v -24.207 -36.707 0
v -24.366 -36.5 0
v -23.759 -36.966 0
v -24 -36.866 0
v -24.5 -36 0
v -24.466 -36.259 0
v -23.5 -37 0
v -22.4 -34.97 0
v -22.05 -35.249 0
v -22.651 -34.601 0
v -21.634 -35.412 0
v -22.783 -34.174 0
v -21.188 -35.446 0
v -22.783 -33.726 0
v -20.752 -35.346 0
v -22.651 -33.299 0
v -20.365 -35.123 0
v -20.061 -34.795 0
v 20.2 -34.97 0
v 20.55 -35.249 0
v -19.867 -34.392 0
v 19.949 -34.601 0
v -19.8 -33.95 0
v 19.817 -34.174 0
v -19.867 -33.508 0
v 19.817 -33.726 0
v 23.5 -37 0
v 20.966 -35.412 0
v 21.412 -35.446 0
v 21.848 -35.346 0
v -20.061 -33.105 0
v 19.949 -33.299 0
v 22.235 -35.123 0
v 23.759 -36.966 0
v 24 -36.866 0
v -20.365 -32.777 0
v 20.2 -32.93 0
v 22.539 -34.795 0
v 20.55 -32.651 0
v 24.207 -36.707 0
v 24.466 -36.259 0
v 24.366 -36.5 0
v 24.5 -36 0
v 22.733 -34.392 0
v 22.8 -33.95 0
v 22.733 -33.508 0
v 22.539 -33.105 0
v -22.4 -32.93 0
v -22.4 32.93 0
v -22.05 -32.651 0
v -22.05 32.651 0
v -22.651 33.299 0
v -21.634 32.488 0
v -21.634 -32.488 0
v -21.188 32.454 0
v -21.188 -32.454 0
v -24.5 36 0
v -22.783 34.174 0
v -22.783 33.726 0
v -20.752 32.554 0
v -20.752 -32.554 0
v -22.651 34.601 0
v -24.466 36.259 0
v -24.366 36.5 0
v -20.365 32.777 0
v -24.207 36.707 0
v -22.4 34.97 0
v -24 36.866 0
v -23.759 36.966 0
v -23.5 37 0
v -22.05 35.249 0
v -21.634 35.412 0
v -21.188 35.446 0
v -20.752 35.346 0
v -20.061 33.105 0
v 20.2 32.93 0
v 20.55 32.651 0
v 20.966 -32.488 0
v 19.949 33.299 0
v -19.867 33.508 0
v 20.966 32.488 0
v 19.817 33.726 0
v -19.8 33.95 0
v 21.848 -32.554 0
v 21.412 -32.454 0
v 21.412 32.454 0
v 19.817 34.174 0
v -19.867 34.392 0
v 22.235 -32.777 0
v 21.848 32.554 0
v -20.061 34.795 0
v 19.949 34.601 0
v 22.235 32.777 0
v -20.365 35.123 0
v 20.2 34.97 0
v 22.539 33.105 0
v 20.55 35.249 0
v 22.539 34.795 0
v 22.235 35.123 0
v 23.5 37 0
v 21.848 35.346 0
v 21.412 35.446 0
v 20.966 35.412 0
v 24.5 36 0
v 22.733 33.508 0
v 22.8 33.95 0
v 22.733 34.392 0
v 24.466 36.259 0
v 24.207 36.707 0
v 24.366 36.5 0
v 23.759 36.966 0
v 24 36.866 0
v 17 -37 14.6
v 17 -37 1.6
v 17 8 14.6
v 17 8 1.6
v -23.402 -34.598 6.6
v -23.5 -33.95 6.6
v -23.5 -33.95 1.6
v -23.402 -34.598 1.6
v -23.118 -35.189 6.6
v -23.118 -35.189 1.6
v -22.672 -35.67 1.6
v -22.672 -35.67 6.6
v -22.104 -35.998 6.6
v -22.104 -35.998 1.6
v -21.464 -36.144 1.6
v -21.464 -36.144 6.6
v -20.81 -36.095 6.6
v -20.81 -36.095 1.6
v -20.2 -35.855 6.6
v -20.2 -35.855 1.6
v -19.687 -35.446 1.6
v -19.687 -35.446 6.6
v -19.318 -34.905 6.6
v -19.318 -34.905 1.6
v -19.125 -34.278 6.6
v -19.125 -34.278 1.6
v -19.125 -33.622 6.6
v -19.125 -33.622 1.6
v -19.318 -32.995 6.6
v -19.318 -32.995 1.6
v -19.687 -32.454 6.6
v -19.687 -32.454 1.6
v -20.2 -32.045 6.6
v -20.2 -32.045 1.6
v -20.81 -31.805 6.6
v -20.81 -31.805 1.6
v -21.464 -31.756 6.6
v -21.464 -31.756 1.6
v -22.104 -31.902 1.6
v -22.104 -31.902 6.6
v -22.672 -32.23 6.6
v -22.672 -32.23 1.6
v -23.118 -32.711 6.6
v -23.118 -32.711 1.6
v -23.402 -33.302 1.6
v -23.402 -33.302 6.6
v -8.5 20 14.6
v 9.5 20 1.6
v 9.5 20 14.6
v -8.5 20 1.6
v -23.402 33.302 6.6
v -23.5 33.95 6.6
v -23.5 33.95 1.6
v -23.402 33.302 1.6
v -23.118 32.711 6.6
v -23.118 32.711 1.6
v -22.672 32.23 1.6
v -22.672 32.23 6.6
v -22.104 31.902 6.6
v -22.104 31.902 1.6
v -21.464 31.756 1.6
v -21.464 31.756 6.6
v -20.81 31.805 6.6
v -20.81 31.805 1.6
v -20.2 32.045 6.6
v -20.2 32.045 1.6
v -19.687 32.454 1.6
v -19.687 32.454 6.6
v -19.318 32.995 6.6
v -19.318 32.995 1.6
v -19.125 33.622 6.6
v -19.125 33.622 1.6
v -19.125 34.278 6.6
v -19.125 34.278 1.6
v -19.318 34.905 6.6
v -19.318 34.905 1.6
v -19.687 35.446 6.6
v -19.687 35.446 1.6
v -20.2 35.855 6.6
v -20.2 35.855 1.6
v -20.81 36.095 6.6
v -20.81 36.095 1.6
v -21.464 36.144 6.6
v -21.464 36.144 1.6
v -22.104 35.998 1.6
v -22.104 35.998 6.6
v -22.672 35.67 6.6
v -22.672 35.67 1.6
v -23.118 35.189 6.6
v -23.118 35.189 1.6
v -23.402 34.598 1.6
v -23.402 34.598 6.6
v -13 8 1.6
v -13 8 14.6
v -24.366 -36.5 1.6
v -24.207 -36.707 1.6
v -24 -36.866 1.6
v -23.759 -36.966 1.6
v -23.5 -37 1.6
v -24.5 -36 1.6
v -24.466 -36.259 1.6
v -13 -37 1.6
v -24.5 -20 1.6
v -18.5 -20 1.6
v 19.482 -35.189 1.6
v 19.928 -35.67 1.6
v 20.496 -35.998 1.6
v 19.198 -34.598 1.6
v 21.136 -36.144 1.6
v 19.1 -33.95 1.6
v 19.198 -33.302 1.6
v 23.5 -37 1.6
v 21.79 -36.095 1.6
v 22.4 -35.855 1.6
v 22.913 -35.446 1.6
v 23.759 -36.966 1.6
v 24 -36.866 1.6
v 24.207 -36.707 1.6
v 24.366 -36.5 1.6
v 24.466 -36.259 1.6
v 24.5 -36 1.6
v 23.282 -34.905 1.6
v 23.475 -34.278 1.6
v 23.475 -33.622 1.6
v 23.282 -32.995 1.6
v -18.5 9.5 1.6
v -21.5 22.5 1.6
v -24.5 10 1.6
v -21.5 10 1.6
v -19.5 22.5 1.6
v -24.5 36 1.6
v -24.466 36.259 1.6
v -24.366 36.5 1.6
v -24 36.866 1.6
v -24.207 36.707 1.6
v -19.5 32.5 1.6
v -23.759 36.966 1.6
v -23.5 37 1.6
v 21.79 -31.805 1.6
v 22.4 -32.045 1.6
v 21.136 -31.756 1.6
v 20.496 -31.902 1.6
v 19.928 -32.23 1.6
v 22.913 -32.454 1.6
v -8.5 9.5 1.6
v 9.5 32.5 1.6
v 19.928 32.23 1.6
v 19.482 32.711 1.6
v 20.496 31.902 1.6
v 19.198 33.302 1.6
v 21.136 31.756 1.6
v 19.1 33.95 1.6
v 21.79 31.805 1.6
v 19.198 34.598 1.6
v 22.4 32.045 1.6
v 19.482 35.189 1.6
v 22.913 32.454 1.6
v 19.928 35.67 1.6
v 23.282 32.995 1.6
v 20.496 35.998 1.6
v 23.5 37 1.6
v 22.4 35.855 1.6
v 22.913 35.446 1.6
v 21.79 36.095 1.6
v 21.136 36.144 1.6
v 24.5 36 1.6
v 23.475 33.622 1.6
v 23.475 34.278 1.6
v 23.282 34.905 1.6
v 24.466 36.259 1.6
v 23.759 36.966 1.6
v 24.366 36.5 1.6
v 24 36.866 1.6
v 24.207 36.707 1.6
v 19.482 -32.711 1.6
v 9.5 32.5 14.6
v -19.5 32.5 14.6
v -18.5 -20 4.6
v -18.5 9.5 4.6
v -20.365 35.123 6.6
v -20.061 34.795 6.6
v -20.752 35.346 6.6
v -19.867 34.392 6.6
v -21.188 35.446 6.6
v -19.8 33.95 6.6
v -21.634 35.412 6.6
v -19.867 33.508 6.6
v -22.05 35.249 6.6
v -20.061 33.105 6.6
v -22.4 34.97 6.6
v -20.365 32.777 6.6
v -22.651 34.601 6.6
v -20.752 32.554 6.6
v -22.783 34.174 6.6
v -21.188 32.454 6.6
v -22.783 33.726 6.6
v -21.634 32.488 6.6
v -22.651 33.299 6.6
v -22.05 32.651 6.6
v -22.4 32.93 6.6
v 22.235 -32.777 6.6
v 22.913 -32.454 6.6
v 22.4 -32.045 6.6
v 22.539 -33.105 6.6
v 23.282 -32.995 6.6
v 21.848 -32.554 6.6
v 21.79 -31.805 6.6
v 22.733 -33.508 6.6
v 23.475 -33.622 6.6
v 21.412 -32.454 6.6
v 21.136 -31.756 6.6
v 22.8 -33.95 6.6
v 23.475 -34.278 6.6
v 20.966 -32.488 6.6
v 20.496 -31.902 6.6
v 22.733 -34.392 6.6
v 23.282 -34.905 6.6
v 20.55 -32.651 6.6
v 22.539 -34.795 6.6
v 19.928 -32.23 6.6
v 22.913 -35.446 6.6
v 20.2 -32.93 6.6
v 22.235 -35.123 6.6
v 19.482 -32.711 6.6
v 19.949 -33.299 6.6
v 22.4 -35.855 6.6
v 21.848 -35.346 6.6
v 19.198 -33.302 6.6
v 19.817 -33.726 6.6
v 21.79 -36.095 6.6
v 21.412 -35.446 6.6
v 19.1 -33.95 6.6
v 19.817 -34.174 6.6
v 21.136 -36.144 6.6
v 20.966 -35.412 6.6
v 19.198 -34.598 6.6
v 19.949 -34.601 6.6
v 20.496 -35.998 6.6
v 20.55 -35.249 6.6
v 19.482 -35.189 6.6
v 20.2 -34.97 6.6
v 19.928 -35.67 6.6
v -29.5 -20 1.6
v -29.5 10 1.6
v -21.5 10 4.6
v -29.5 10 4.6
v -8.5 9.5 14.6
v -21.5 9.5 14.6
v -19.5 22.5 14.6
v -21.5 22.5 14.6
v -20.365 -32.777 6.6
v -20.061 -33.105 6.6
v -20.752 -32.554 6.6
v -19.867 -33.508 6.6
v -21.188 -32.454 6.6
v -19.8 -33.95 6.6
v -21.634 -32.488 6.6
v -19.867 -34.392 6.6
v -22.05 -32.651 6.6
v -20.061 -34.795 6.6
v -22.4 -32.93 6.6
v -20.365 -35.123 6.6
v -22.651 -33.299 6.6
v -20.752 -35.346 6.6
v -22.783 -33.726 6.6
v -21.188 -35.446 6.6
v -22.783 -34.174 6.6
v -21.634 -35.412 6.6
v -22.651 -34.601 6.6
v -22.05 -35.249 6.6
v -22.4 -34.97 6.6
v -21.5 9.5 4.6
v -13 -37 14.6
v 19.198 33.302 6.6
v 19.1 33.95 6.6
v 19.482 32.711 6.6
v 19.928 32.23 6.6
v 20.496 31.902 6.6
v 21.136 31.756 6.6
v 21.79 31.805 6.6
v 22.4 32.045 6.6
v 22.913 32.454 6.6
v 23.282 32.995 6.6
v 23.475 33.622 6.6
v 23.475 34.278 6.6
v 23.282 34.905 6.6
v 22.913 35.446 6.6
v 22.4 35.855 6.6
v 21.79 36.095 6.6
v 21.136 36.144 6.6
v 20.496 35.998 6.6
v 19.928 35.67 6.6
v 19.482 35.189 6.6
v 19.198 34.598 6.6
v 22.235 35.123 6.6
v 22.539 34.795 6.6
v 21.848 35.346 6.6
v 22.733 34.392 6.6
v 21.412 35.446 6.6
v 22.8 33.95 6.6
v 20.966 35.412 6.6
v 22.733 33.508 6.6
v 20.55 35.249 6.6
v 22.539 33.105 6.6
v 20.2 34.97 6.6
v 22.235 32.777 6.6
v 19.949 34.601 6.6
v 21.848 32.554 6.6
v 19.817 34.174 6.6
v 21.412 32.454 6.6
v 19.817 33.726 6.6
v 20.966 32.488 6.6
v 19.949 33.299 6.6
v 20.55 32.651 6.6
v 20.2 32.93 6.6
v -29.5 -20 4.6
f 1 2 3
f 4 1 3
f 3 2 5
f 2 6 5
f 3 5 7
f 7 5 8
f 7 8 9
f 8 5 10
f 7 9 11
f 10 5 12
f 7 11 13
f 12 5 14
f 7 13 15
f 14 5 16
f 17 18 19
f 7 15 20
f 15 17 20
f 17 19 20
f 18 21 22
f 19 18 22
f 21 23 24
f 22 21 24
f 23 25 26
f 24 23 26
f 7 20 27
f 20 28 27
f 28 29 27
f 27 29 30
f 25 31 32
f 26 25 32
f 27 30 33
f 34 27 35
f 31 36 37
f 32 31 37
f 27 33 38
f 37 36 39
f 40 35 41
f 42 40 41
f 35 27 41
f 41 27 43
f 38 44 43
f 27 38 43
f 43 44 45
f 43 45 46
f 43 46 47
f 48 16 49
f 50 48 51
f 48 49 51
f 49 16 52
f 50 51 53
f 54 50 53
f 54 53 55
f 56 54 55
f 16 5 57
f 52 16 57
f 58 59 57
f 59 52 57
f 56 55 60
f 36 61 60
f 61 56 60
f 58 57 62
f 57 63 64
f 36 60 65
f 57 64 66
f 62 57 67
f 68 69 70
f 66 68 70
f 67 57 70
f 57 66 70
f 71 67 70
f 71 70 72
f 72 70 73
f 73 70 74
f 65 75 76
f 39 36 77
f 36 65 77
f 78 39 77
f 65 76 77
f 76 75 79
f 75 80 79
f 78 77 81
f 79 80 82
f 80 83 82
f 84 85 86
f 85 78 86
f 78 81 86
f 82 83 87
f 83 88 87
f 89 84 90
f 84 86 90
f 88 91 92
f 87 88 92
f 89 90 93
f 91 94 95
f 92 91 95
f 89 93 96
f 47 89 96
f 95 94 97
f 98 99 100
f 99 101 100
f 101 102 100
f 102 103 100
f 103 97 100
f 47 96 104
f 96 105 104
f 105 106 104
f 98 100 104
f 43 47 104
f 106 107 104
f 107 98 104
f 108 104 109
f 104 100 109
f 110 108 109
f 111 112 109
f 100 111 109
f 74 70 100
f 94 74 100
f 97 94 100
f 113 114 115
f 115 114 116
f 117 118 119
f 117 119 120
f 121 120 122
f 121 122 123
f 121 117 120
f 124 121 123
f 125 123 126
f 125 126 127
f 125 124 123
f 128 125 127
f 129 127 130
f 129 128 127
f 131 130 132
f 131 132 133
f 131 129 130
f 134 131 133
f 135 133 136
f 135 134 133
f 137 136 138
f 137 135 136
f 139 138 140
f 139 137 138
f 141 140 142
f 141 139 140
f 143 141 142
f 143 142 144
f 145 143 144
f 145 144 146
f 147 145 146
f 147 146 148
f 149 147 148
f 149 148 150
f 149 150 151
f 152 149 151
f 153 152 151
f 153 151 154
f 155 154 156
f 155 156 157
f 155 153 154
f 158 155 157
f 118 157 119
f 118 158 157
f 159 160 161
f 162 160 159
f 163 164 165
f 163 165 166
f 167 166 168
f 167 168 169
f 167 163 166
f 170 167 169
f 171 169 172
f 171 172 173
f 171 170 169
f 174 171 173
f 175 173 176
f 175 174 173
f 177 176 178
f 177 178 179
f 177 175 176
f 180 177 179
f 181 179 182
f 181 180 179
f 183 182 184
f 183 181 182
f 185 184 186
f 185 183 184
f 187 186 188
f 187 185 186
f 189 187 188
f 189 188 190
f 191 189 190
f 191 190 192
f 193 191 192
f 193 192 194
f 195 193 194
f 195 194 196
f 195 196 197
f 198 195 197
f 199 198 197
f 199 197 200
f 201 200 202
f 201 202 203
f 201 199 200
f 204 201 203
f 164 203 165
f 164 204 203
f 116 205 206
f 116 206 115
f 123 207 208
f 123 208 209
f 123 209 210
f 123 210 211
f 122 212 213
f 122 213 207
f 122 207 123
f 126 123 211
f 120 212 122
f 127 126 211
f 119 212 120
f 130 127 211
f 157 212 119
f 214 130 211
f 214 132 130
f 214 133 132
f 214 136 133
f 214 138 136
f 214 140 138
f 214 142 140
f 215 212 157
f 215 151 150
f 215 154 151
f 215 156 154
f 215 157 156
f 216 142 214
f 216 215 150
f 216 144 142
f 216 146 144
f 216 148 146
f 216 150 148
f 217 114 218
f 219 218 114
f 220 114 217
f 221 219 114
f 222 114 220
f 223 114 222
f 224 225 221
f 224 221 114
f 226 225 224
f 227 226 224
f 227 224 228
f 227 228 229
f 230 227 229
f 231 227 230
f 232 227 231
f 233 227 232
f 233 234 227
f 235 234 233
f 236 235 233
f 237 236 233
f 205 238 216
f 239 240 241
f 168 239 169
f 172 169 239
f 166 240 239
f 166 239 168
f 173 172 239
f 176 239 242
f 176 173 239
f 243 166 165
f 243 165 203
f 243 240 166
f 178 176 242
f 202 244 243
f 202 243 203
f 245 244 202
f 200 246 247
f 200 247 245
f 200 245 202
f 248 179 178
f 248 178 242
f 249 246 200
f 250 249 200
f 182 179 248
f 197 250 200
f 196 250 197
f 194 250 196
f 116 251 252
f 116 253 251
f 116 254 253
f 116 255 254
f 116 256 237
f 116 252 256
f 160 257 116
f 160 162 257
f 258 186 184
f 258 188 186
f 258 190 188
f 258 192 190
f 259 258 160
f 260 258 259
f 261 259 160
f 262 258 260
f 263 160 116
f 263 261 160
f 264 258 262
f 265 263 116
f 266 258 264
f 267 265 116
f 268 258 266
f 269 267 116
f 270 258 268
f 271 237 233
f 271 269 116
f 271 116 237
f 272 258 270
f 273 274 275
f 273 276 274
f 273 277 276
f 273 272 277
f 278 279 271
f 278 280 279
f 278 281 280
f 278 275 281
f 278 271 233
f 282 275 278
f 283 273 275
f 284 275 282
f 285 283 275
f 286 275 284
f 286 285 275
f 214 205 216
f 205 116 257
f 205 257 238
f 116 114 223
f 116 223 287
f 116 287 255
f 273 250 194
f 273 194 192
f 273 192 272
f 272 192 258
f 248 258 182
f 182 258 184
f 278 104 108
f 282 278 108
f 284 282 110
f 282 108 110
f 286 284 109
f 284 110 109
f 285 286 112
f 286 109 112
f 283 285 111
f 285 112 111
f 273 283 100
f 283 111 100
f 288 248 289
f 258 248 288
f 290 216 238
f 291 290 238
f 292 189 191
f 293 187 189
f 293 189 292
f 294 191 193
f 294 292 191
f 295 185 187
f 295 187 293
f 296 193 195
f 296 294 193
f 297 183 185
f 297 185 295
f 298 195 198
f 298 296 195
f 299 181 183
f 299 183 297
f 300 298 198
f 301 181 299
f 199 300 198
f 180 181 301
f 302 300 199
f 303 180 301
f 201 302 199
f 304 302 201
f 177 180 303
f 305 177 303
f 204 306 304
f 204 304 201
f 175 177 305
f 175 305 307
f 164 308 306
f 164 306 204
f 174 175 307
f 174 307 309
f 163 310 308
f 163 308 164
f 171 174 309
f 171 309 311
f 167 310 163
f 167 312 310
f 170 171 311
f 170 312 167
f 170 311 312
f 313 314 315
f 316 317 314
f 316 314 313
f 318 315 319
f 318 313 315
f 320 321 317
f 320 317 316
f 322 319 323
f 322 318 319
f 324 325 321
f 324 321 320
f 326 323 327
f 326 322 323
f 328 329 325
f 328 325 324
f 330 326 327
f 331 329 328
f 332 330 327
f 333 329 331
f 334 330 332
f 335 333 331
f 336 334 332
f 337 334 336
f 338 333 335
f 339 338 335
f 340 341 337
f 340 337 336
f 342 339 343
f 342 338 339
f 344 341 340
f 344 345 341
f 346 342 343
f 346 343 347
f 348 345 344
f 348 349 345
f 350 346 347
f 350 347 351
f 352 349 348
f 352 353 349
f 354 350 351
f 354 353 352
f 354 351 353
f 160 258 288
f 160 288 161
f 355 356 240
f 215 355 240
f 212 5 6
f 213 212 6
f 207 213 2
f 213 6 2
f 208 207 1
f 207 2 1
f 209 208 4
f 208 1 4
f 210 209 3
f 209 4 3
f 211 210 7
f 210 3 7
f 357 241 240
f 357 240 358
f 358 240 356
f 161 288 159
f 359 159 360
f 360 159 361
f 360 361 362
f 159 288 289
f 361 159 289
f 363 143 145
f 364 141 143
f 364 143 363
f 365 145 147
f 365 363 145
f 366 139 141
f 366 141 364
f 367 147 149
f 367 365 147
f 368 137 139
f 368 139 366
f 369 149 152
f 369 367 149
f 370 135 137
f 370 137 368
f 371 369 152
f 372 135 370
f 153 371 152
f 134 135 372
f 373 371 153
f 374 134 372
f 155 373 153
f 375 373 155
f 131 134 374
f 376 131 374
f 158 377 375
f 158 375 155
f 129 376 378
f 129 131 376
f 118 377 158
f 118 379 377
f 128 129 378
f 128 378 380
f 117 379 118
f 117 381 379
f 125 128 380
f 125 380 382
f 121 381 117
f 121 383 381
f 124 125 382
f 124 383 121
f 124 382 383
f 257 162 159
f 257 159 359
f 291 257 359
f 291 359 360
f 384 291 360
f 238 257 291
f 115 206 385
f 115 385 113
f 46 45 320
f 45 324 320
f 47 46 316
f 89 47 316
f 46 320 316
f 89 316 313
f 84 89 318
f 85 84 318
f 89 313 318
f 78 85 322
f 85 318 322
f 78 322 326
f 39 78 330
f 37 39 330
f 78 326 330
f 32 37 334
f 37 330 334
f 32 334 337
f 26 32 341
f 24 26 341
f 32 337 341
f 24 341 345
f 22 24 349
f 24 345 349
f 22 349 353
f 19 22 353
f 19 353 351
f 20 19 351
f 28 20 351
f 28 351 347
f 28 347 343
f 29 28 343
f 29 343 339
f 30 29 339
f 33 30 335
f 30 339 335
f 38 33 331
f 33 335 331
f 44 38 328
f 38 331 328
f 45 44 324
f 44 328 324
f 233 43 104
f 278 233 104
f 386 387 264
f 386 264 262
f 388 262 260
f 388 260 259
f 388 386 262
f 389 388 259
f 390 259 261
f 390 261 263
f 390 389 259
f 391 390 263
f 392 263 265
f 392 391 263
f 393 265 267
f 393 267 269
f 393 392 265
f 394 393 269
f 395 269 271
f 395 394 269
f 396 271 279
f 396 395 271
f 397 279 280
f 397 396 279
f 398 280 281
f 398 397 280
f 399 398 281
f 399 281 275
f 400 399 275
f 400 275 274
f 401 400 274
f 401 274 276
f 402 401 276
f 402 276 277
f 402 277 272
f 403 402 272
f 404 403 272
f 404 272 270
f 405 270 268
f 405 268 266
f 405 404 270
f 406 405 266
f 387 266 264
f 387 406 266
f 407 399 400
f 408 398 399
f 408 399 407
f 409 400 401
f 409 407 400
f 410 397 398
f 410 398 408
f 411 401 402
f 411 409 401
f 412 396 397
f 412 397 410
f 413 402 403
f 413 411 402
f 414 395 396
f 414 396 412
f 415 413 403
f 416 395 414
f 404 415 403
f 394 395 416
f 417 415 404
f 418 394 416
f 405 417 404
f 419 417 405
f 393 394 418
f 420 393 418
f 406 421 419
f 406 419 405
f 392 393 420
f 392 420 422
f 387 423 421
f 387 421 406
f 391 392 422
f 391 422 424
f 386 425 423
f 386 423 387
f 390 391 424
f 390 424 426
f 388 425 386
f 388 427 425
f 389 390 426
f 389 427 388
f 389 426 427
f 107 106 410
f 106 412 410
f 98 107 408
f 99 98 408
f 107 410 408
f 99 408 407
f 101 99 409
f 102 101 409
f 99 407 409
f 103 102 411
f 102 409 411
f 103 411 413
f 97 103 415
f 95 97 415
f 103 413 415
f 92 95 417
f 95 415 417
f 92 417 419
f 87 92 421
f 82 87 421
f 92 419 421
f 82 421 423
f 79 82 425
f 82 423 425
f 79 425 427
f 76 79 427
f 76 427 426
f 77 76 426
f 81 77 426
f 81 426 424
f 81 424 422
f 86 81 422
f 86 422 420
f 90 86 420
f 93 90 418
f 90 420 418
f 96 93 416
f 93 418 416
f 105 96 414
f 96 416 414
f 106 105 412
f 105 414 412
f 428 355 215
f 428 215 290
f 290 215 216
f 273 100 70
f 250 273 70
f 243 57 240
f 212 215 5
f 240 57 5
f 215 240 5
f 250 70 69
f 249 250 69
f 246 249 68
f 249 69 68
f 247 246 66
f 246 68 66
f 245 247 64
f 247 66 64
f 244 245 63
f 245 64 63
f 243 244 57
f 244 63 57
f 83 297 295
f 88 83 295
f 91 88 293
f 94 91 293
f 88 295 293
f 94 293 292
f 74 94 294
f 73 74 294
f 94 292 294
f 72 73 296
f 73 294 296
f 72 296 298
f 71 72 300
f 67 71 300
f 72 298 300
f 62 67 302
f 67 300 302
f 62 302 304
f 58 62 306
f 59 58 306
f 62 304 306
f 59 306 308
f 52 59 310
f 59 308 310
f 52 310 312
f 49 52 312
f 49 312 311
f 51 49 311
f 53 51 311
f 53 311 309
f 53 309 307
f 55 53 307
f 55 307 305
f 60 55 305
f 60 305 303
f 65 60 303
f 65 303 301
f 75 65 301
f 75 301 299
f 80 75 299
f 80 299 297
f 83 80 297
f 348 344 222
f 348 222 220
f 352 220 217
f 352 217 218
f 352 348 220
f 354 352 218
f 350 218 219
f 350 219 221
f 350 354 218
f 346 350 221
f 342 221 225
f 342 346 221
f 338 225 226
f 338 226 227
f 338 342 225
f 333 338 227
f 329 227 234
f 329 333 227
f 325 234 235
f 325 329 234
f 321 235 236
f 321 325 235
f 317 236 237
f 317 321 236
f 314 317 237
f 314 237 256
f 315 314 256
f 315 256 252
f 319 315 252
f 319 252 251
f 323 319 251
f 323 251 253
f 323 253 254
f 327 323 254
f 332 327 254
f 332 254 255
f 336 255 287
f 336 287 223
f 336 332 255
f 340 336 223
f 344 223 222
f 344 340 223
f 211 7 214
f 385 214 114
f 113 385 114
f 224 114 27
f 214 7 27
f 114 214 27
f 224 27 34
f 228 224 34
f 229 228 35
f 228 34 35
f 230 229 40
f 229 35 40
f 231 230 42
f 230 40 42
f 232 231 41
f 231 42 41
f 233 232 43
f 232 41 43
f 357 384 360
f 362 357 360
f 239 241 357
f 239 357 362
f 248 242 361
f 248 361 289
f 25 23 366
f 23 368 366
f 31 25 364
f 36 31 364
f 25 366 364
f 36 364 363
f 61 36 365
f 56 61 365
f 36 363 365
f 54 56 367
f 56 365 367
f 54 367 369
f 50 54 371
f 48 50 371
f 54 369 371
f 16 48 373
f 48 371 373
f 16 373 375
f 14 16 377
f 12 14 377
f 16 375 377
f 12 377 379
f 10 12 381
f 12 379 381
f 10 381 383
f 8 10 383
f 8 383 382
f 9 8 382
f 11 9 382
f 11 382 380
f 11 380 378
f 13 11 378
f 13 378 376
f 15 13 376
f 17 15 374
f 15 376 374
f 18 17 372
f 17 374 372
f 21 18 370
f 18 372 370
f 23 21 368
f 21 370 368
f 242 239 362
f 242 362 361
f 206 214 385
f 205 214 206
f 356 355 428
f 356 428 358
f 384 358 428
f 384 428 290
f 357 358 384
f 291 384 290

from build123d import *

# Parameters (mm, degrees)
EXTRUDE_1_DEPTH     = 1.6
SKETCH_2_R          = 1.5
CUT_EXTRUDE_1_DEPTH = 45.405067278
EXTRUDE_START       = 5
SKETCH_5_R          = 2.2
SKETCH_5_R_2        = 1.5
EXTRUDE_2_DEPTH     = 5
SKETCH_6_W          = 30
SKETCH_6_H          = 45
EXTRUDE_3_DEPTH     = 13
SKETCH_7_W          = 5
SKETCH_7_H          = 30
EXTRUDE_4_DEPTH     = 3


with BuildPart() as part:
    # 草图1 → 凸台-拉伸1 (new body)
    with BuildSketch(Plane.XY):
        with BuildLine():
            Line((-23.5, -37), (23.5, -37))
            ThreePointArc((23.5, -37), (24.207106781, -36.707106781), (24.5, -36))
            Line((24.5, -36), (24.5, 36))
            ThreePointArc((24.5, 36), (24.207106781, 36.707106781), (23.5, 37))
            Line((23.5, 37), (-23.5, 37))
            ThreePointArc((-23.5, 37), (-24.207106781, 36.707106781), (-24.5, 36))
            Line((-24.5, 36), (-24.5, -36))
            ThreePointArc((-24.5, -36), (-24.207106781, -36.707106781), (-23.5, -37))
        make_face()
    extrude(amount=EXTRUDE_1_DEPTH)

    # 草图2 → 切除-拉伸1 (cut, through all)
    with BuildSketch(Plane.XY.offset(1.6)):
        with Locations((21.3, 33.95)):
            Circle(SKETCH_2_R)
        with Locations((-21.3, 33.95)):
            Circle(SKETCH_2_R)
        with Locations((-21.3, -33.95)):
            Circle(SKETCH_2_R)
        with Locations((21.3, -33.95)):
            Circle(SKETCH_2_R)
    extrude(amount=-CUT_EXTRUDE_1_DEPTH, mode=Mode.SUBTRACT)

    # 草图5 → 凸台-拉伸2 (add)
    # profile 1 of 4: a face of its own
    with BuildSketch(Plane.XY.offset(1.6).offset(EXTRUDE_START)):
        with Locations(Location((-21.3, 33.95, 0), (0, 0, 180))):
            Circle(SKETCH_5_R)
        with Locations((-21.3, 33.95)):
            Circle(SKETCH_5_R_2, mode=Mode.SUBTRACT)
    # profile 2 of 4: a face of its own
    with BuildSketch(Plane.XY.offset(1.6).offset(EXTRUDE_START)):
        with Locations(Location((21.3, -33.95, 0), (0, 0, 180))):
            Circle(SKETCH_5_R)
        with Locations((21.3, -33.95)):
            Circle(SKETCH_5_R_2, mode=Mode.SUBTRACT)
    # profile 3 of 4: a face of its own
    with BuildSketch(Plane.XY.offset(1.6).offset(EXTRUDE_START)):
        with Locations(Location((-21.3, -33.95, 0), (0, 0, 180))):
            Circle(SKETCH_5_R)
        with Locations((-21.3, -33.95)):
            Circle(SKETCH_5_R_2, mode=Mode.SUBTRACT)
    # profile 4 of 4: a face of its own
    with BuildSketch(Plane.XY.offset(1.6).offset(EXTRUDE_START)):
        with Locations(Location((21.3, 33.95, 0), (0, 0, 180))):
            Circle(SKETCH_5_R)
        with Locations((21.3, 33.95)):
            Circle(SKETCH_5_R_2, mode=Mode.SUBTRACT)
    extrude(amount=-EXTRUDE_2_DEPTH)

    # 草图6 → 凸台-拉伸3 (add)
    with BuildSketch(Plane.XY.offset(1.6)):
        Polygon((-8.5, 9.5), (-21.5, 9.5), (-21.5, 22.5), (-19.5, 22.5), (-19.5, 32.5), (9.5, 32.5), (9.5, 20), (-8.5, 20), align=None)
        with Locations((2, -14.5)):
            Rectangle(SKETCH_6_W, SKETCH_6_H)
    extrude(amount=EXTRUDE_3_DEPTH)

    # 草图7 → 凸台-拉伸4 (add)
    with BuildSketch(Plane.XY.offset(1.6)):
        with Locations((-27, -5)):
            Rectangle(SKETCH_7_W, SKETCH_7_H)
        Polygon((-24.5, 10), (-24.5, -20), (-18.5, -20), (-18.5, 9.5), (-21.5, 9.5), (-21.5, 10), align=None)
    extrude(amount=EXTRUDE_4_DEPTH)


solid = part.part
